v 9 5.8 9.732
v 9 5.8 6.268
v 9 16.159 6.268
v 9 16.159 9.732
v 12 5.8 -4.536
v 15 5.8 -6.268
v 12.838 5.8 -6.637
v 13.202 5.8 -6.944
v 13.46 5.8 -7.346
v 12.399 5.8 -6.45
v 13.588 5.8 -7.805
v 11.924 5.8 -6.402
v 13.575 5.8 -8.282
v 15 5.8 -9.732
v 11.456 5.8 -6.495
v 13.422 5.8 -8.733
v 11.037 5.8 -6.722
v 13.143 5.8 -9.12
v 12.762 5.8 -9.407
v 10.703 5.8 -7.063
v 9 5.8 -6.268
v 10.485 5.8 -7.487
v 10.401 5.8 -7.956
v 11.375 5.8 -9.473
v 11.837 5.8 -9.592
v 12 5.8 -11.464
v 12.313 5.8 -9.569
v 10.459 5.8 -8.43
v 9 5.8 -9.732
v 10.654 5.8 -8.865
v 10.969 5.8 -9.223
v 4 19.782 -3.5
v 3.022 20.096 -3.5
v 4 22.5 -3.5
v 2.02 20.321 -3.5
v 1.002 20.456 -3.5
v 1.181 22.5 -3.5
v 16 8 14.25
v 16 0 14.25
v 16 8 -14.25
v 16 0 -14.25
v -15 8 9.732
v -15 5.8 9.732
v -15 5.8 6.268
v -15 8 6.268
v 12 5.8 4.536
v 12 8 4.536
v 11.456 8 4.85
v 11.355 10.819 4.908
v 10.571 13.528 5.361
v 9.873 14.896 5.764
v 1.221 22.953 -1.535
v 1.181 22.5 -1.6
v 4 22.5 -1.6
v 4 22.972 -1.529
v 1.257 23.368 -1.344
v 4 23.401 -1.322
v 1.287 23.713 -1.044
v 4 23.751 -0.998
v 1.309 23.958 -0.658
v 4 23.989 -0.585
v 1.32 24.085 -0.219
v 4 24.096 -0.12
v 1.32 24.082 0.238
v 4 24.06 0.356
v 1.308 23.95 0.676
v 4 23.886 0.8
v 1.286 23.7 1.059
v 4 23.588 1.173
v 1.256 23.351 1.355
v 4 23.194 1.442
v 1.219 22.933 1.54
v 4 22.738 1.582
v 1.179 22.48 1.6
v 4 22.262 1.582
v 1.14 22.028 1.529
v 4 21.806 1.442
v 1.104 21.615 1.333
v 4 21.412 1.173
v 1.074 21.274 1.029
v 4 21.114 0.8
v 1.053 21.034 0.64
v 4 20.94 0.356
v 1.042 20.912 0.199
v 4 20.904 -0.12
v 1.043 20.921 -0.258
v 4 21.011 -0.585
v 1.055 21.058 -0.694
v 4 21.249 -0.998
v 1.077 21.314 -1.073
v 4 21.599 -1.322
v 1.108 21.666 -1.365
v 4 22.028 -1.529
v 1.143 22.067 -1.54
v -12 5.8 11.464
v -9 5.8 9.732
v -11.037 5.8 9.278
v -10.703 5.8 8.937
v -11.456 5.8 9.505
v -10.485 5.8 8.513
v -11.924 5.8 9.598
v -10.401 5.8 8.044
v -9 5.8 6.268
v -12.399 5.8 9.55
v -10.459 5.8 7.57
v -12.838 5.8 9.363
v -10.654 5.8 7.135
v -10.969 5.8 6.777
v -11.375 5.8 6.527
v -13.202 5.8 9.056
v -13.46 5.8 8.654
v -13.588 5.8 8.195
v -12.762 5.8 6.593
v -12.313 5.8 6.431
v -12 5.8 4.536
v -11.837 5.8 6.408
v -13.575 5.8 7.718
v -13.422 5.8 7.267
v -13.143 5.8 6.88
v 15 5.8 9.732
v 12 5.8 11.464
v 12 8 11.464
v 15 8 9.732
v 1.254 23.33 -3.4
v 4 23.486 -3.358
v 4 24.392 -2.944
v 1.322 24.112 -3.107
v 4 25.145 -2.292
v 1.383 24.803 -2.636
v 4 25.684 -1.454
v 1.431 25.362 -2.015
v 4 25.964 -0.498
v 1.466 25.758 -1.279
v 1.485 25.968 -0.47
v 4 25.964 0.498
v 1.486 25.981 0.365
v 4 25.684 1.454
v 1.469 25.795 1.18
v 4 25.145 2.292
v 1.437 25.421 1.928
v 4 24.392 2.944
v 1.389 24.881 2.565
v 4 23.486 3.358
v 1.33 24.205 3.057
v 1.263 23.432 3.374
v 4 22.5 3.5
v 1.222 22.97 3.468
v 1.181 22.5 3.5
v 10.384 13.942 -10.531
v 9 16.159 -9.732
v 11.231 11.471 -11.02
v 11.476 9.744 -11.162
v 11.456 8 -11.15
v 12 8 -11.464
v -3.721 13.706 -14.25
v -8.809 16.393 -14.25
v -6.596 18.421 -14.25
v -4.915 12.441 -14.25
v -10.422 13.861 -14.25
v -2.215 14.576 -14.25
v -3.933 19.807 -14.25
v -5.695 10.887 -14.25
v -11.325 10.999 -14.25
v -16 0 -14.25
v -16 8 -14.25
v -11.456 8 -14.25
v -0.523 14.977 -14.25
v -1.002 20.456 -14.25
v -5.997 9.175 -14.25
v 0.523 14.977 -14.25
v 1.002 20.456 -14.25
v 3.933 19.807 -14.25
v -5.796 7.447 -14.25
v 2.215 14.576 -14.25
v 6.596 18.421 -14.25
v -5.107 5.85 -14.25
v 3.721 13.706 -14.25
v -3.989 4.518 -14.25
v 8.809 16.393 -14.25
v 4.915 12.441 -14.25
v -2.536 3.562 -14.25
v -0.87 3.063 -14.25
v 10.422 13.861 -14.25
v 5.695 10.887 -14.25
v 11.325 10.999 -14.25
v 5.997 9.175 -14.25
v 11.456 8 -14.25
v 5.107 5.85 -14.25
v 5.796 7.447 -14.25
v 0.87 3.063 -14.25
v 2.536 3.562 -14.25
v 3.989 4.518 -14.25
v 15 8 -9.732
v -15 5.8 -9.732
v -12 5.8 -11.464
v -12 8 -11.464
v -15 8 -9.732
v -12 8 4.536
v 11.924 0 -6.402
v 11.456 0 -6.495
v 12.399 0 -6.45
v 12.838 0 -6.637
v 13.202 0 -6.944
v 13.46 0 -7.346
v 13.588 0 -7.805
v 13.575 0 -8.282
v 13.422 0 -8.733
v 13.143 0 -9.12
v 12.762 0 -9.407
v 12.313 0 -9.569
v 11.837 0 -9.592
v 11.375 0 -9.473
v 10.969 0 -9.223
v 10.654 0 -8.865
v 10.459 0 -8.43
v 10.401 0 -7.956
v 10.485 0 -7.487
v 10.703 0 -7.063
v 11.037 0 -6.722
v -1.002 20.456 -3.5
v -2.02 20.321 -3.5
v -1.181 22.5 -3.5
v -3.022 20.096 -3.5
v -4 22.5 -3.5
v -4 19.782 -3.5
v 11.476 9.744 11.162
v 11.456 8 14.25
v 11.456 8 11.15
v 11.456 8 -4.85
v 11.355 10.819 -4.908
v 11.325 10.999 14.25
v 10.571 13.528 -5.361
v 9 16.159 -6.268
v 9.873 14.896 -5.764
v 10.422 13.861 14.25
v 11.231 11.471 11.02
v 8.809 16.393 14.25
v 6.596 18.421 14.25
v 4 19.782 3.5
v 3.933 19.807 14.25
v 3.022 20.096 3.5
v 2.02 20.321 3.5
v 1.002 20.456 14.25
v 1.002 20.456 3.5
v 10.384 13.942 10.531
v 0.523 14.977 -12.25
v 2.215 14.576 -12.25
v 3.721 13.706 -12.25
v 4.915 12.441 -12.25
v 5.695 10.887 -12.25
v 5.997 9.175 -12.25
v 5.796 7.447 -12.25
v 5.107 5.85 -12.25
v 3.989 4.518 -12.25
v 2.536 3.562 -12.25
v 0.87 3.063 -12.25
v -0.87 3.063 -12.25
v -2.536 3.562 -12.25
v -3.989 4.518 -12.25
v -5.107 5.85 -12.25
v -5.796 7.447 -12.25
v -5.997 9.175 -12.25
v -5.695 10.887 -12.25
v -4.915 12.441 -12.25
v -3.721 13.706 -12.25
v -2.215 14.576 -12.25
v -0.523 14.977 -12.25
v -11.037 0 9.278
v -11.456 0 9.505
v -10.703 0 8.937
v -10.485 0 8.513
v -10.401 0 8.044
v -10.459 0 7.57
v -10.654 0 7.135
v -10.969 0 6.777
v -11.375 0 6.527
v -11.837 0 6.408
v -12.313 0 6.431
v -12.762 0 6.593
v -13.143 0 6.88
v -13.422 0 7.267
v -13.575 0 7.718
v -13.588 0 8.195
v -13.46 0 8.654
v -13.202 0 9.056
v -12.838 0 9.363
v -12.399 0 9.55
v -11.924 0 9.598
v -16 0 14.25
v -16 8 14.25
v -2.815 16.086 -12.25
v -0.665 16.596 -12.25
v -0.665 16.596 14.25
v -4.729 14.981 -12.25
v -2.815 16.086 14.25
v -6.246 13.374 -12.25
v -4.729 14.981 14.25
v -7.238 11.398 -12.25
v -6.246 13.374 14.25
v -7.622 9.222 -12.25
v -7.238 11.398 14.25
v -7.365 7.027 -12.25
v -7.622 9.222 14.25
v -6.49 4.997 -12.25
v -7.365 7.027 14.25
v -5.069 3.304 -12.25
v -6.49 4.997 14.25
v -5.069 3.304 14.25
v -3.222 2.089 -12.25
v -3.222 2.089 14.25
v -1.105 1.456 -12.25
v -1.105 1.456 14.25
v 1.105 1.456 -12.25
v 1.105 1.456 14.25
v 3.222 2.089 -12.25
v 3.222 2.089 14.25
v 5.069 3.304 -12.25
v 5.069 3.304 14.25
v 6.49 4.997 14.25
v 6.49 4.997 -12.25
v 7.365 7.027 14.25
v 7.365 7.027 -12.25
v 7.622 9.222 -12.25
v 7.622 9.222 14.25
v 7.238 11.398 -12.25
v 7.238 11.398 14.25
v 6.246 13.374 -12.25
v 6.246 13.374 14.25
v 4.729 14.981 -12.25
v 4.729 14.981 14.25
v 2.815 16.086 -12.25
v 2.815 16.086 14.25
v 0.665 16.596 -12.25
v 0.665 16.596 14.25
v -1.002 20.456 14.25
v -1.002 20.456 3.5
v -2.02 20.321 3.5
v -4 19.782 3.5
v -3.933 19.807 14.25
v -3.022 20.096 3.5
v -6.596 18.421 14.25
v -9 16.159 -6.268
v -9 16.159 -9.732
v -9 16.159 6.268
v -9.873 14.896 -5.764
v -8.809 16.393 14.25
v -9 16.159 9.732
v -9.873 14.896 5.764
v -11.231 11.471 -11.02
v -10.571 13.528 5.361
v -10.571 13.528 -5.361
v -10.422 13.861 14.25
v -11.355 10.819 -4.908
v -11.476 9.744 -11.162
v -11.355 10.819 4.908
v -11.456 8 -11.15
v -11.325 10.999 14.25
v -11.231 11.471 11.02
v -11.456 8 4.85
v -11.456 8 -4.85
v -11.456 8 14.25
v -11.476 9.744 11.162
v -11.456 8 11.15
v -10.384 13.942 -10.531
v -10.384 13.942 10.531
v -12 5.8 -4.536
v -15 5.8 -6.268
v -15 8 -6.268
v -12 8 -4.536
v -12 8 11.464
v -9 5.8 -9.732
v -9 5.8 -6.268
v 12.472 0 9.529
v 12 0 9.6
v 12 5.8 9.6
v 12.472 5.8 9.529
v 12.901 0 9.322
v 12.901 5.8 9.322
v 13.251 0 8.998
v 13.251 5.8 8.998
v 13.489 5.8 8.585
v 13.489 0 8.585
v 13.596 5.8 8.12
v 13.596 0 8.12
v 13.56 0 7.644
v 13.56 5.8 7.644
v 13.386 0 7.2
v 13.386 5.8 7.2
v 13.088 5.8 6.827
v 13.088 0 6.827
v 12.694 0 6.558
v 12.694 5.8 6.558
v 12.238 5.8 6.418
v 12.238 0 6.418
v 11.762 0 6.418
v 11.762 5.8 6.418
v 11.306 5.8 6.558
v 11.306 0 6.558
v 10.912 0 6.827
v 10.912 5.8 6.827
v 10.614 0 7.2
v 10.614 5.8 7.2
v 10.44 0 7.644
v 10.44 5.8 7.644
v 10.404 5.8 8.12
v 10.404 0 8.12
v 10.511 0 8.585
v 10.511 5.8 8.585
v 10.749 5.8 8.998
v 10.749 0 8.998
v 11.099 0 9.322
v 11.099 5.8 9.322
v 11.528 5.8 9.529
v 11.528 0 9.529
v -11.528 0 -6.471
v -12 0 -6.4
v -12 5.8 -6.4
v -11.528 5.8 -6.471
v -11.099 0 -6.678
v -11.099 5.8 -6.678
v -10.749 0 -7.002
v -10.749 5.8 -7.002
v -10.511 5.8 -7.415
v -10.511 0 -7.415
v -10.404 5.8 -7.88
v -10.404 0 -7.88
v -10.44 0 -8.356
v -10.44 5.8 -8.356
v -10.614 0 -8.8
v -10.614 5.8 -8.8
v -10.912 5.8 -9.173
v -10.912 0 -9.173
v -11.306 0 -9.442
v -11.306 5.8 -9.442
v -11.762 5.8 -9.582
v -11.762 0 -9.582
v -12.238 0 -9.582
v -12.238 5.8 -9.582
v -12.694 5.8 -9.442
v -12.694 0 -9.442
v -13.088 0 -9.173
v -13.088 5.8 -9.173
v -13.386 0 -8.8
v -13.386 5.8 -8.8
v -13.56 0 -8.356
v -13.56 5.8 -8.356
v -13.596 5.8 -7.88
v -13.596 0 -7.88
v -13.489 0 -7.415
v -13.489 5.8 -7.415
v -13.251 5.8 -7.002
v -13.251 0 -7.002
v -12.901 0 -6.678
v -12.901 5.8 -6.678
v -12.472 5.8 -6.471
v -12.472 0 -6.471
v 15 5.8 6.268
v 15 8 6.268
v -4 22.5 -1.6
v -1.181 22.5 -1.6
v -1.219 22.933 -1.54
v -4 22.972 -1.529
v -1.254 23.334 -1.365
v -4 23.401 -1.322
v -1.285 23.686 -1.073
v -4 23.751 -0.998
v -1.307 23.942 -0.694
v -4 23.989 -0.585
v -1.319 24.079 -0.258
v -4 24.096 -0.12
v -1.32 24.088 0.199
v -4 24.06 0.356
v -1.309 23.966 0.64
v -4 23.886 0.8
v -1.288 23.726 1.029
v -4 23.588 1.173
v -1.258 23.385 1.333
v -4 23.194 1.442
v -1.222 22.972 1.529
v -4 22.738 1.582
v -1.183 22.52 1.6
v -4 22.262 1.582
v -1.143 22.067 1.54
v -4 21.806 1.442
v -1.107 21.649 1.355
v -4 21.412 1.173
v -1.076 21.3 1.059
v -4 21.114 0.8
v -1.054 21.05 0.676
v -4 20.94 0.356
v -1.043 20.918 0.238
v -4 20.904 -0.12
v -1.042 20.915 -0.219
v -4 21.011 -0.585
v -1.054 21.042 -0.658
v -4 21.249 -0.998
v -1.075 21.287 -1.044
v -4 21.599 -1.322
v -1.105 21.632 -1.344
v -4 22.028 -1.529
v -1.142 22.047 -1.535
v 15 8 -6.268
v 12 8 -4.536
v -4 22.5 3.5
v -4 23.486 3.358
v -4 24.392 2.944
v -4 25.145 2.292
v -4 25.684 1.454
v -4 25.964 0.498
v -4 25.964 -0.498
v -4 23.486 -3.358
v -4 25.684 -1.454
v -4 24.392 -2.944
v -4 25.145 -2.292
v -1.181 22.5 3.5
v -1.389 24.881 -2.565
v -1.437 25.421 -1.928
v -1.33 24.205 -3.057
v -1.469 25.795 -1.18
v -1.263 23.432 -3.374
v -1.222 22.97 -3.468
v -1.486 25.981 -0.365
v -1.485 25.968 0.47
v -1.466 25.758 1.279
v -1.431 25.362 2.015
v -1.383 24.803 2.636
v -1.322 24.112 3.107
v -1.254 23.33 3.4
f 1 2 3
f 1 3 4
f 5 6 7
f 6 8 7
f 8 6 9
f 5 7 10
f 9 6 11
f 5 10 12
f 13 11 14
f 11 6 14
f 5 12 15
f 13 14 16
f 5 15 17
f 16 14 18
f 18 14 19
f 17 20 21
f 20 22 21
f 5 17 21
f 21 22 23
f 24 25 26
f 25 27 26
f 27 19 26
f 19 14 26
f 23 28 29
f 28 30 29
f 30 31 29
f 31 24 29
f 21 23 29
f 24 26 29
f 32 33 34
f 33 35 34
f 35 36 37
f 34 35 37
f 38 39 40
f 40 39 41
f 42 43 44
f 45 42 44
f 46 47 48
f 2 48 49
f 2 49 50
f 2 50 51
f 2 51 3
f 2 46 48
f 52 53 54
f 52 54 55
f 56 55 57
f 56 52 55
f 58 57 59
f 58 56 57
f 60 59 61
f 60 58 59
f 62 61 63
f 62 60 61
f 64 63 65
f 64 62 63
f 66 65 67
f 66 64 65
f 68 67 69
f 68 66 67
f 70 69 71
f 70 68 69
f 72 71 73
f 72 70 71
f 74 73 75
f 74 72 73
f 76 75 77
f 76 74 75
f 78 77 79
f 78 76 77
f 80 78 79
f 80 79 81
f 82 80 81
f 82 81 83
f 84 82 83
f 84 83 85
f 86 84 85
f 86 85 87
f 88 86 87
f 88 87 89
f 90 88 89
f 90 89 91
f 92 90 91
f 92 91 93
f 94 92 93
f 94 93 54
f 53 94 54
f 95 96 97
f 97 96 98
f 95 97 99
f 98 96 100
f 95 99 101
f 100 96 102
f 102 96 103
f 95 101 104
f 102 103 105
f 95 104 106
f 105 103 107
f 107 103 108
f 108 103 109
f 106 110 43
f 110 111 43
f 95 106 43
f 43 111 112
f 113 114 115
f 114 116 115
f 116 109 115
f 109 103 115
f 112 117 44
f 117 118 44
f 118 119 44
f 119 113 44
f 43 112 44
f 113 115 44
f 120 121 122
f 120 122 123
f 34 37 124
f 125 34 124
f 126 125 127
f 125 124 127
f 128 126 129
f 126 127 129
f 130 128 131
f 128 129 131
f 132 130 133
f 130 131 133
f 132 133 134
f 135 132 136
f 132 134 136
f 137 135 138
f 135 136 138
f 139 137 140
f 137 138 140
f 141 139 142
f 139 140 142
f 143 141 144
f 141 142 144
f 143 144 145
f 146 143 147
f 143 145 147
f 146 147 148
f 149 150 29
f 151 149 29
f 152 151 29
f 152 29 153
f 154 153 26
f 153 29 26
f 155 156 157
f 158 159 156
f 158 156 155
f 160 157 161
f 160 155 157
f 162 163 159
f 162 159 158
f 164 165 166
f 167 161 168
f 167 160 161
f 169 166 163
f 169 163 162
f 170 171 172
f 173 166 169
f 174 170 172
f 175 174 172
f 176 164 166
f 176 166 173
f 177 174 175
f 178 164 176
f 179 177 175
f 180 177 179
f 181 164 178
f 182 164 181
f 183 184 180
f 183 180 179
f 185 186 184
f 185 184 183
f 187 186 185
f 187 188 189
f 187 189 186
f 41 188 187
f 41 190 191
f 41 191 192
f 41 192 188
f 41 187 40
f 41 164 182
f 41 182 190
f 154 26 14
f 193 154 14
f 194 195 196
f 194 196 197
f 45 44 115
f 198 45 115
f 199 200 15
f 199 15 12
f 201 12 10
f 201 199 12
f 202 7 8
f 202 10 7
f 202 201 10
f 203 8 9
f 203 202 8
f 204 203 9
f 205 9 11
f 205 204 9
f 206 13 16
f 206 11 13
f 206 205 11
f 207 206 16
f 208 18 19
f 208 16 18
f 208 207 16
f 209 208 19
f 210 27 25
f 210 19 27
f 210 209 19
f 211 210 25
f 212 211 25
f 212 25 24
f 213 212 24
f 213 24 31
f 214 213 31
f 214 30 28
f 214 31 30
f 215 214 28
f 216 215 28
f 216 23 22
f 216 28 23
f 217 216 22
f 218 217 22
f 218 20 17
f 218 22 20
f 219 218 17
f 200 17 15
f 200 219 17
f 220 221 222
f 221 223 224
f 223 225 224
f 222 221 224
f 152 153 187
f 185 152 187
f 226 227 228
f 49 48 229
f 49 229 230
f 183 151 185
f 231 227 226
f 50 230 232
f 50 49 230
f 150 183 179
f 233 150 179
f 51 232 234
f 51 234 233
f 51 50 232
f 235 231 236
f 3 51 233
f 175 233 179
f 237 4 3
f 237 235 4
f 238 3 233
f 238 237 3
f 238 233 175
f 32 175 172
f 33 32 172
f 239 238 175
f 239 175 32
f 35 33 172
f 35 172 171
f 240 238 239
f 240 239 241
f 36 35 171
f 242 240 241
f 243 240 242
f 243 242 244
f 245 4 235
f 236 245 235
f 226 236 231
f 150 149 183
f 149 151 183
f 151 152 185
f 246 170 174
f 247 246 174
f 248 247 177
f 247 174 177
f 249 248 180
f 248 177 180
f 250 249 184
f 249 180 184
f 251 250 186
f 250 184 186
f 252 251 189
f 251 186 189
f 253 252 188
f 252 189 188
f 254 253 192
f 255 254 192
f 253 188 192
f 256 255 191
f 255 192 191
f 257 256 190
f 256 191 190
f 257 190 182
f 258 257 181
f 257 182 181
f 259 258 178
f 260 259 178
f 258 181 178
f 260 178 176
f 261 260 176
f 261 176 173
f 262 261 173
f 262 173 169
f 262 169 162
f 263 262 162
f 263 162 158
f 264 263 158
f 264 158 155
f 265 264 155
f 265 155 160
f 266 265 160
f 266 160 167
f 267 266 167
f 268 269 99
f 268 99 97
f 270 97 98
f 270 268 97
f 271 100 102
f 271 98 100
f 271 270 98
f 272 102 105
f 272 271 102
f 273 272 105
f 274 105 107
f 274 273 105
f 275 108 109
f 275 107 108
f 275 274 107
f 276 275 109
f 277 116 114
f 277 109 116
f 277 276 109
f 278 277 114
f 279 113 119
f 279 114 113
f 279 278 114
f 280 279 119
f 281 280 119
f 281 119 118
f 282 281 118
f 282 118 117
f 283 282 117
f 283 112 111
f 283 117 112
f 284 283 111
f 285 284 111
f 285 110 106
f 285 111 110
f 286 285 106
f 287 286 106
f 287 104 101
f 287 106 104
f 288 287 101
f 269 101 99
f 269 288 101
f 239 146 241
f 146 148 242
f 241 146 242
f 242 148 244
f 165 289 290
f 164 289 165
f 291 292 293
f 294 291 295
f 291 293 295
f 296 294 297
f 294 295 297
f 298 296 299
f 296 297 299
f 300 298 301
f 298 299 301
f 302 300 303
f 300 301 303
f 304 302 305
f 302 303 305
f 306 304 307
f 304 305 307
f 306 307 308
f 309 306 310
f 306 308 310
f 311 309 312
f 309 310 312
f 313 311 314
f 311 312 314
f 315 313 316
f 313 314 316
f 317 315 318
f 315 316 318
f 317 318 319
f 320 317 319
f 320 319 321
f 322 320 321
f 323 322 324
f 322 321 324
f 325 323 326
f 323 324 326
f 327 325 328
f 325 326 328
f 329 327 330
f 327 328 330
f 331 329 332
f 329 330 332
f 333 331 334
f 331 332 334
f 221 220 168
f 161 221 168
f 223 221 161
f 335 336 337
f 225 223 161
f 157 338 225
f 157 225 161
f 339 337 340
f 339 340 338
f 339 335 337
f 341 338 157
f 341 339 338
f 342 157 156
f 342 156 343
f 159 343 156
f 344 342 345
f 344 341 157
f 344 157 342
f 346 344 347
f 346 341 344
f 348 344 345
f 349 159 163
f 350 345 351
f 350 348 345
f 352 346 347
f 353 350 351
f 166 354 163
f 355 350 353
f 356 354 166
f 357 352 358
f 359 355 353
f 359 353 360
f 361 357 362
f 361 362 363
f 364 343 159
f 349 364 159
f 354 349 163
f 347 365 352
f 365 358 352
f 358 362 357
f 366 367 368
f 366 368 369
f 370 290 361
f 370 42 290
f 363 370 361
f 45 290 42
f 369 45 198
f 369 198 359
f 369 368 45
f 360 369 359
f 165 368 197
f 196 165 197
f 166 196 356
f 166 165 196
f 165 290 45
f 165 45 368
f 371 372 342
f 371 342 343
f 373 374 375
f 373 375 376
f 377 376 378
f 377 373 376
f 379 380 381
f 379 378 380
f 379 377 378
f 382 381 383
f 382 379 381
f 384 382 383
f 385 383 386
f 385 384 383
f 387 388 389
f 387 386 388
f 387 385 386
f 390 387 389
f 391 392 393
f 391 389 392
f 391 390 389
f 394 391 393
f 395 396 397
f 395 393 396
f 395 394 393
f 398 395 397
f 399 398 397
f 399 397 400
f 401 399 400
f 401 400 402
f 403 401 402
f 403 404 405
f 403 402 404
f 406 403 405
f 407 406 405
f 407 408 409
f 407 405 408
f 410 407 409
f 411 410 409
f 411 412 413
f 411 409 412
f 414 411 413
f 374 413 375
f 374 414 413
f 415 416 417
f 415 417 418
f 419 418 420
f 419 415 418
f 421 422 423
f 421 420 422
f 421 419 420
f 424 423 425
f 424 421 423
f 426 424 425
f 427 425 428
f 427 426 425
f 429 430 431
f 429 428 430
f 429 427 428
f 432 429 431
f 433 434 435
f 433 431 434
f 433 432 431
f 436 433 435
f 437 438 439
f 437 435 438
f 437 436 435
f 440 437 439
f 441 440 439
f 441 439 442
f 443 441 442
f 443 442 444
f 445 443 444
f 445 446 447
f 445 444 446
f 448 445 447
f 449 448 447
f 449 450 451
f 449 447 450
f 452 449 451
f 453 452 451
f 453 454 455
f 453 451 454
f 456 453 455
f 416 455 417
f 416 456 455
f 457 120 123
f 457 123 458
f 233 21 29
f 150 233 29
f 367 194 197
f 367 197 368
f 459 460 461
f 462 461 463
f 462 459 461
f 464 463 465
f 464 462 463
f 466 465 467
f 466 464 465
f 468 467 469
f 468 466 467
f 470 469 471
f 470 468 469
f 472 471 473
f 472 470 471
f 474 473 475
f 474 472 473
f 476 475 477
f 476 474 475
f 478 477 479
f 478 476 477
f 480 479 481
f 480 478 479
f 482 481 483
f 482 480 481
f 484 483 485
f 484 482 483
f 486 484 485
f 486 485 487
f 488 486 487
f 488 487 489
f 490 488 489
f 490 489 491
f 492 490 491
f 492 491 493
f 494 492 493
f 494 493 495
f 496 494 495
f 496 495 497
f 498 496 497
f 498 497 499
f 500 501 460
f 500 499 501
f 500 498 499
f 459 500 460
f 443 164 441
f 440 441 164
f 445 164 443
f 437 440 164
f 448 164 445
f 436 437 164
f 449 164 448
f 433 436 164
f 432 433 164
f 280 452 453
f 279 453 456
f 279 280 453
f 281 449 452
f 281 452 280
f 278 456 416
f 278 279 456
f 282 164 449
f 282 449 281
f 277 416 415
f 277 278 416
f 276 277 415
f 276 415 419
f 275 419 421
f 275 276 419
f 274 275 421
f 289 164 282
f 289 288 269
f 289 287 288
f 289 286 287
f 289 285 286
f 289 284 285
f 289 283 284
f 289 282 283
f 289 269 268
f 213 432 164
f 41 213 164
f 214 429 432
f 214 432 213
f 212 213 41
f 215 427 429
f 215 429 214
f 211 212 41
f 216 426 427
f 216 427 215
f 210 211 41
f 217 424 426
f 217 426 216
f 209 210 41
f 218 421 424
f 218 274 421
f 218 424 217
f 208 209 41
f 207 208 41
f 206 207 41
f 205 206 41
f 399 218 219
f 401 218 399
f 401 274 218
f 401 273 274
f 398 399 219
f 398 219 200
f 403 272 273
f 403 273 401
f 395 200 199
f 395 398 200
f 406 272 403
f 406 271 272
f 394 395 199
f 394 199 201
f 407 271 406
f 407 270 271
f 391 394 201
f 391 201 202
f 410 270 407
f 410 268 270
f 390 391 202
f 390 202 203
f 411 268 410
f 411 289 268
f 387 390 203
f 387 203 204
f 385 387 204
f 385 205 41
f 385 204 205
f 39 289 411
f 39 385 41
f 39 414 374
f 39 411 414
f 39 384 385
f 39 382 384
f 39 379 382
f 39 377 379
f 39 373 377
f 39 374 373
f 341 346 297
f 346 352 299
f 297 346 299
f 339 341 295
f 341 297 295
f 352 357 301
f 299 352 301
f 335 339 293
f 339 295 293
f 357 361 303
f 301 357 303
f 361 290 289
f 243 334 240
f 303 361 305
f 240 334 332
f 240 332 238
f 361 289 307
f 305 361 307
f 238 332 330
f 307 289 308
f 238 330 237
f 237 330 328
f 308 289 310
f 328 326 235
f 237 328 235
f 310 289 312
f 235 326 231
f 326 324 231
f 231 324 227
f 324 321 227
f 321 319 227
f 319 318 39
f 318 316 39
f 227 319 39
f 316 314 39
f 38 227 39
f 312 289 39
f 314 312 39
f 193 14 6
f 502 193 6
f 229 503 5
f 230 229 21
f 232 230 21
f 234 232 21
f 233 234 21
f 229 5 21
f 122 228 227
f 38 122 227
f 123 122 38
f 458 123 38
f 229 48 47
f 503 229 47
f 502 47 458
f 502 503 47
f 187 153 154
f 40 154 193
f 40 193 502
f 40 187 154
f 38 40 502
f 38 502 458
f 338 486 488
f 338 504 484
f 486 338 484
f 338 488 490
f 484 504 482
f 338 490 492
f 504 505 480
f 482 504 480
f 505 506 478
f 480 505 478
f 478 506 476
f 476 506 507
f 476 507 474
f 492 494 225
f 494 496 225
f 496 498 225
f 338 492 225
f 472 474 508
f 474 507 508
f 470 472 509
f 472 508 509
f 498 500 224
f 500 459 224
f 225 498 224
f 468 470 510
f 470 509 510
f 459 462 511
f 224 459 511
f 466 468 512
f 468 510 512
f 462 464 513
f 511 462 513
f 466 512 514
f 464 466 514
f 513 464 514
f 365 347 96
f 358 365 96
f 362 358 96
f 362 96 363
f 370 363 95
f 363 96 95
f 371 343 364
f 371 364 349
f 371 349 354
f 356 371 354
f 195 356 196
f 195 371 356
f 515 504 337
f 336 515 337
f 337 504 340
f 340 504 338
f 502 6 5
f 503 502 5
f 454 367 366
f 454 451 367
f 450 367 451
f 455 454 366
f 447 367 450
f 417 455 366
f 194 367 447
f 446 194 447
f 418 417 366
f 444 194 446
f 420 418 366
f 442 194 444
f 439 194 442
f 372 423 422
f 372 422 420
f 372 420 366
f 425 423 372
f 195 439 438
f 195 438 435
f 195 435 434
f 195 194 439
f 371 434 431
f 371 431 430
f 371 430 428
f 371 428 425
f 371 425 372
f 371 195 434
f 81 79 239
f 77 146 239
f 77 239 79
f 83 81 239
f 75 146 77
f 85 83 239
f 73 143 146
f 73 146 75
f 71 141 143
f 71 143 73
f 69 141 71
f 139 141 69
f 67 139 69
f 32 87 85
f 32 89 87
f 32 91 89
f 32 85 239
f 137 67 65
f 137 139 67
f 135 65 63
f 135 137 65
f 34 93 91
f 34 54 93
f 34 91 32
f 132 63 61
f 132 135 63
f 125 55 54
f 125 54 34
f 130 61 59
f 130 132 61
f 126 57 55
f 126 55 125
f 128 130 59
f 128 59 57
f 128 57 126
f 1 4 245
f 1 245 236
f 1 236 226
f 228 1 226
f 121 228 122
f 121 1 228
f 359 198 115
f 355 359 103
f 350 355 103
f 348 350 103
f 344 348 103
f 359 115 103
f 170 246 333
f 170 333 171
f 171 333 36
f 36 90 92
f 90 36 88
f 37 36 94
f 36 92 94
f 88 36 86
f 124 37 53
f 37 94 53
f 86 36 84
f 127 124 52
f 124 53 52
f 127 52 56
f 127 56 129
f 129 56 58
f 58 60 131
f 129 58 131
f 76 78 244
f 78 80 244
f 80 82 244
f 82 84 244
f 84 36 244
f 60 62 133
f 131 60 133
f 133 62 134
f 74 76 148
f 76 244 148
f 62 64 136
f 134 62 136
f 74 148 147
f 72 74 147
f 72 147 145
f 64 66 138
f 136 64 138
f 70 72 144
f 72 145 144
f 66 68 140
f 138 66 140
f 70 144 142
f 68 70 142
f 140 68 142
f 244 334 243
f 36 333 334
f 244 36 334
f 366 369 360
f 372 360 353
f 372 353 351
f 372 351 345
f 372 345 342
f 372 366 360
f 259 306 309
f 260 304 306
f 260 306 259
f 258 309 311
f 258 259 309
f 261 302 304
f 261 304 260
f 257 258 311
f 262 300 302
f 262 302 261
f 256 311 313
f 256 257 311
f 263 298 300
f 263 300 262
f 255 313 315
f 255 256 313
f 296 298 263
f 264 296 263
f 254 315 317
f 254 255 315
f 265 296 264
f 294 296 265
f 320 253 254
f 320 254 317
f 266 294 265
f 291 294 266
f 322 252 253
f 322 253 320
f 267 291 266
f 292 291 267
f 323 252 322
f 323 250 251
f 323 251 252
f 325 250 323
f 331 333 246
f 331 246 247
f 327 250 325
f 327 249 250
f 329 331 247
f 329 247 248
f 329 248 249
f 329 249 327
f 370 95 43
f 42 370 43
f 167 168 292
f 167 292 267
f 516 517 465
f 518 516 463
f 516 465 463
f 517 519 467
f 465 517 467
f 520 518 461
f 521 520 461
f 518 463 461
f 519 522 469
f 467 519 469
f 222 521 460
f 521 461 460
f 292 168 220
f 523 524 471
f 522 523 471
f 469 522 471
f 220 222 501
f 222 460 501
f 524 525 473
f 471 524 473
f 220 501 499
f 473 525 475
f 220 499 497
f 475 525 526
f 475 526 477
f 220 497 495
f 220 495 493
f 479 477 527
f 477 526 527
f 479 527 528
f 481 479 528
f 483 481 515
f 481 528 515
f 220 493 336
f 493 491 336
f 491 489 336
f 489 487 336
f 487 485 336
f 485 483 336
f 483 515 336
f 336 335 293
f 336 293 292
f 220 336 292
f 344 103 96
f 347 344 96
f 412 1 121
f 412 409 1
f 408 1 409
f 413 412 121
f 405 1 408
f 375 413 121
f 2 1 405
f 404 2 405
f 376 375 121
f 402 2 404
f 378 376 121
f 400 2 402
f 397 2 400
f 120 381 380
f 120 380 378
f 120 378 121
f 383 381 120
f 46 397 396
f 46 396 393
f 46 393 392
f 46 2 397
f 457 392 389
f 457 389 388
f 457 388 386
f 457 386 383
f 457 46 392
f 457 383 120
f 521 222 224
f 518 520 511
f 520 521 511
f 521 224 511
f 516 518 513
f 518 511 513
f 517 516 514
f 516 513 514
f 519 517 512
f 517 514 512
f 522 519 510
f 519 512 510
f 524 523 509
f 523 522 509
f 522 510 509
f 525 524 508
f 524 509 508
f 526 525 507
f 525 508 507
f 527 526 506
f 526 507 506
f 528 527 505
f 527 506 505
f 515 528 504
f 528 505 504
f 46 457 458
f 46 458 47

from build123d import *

# Parameters (mm, degrees)
SKETCH1_W                = 32
SKETCH1_H                = 28.5
BOSS_EXTRUDE1_DEPTH      = 8
BOSS_EXTRUDE2_DEPTH      = 28.5
SKETCH4_R                = 7.625
CUT_EXTRUDE2_DEPTH       = 26.5
SKETCH5_R                = 6
CUT_EXTRUDE3_DEPTH       = 39.581083448
CUT_EXTRUDE1_DEPTH       = 25.805493343
CUT_EXTRUDE1_DEPTH_BACK  = 25.805493343
SKETCH2_R                = 1.6
CUT_EXTRUDE4_DEPTH       = 25.805493451
CUT_EXTRUDE4_DEPTH_BACK  = 2.2
BOSS_EXTRUDE3_DEPTH      = 4
BOSS_EXTRUDE3_DEPTH_BACK = 4
SKETCH8_R                = 1.6
CUT_EXTRUDE5_DEPTH       = 42.764219136


with BuildPart() as part:
    # Sketch1 → Boss-Extrude1 (new body)
    with BuildSketch(Plane(origin=(0, 0, 0), x_dir=(1, 0, 0), z_dir=(0, 1, 0))):
        Rectangle(SKETCH1_W, SKETCH1_H)
    extrude(amount=BOSS_EXTRUDE1_DEPTH)

    # Sketch3 → Boss-Extrude2 (add, through all)
    with BuildSketch(Plane.XY.offset(14.25)):
        with BuildLine():
            Line((-7.158910532, 0), (7.158910532, 0))
            ThreePointArc((7.158910532, 0), (0, 20.5), (-7.158910532, 0))
        make_face()
    extrude(amount=-BOSS_EXTRUDE2_DEPTH)

    # Sketch4 → Cut-Extrude2 (cut)
    with BuildSketch(Plane.XY.offset(14.25)):
        with Locations((0, 9)):
            Circle(SKETCH4_R)
    extrude(amount=-CUT_EXTRUDE2_DEPTH, mode=Mode.SUBTRACT)

    # Sketch5 → Cut-Extrude3 (cut, through all)
    with BuildSketch(Plane(origin=(0, 0, -14.25), x_dir=(-1, 0, 0), z_dir=(0, 0, -1))):
        with Locations((0, 9)):
            Circle(SKETCH5_R)
    extrude(amount=-CUT_EXTRUDE3_DEPTH, mode=Mode.SUBTRACT)

    # Sketch2 → Cut-Extrude1 (cut, two sides: drawn at the far end of the back side and taken through both)
    with BuildSketch(Plane(origin=(0, 8, 0), x_dir=(1, 0, 0), z_dir=(0, 1, 0)).offset(-CUT_EXTRUDE1_DEPTH_BACK)):
        with Locations(Location((-12, 8, 0), (0, 0, 270))):
            Circle(SKETCH2_R)
        with Locations(Location((12, 8, 0), (0, 0, 250.139850489))):
            Circle(SKETCH2_R)
        with Locations(Location((12, -8, 0), (0, 0, 270))):
            Circle(SKETCH2_R)
        with Locations(Location((-12, -8, 0), (0, 0, 289.860135815))):
            Circle(SKETCH2_R)
    extrude(amount=CUT_EXTRUDE1_DEPTH + CUT_EXTRUDE1_DEPTH_BACK, mode=Mode.SUBTRACT)

    # Sketch6 → Cut-Extrude4 (cut, two sides: drawn at the far end of the back side and taken through both)
    with BuildSketch(Plane(origin=(0, 8, 0), x_dir=(1, 0, 0), z_dir=(0, 1, 0)).offset(-CUT_EXTRUDE4_DEPTH_BACK)):
        Polygon((-12, 11.464101615), (-15, 9.732050808), (-15, 6.267949192), (-12, 4.535898385), (-9, 6.267949192), (-9, 9.732050808), align=None)
        Polygon((-9, -9.732050808), (-12, -11.464101615), (-15, -9.732050808), (-15, -6.267949192), (-12, -4.535898385), (-9, -6.267949192), align=None)
        Polygon((12, -11.464101615), (15, -9.732050808), (15, -6.267949192), (12, -4.535898385), (9, -6.267949192), (9, -9.732050808), align=None)
        Polygon((9, 9.732050808), (12, 11.464101615), (15, 9.732050808), (15, 6.267949192), (12, 4.535898385), (9, 6.267949192), align=None)
    extrude(amount=CUT_EXTRUDE4_DEPTH + CUT_EXTRUDE4_DEPTH_BACK, mode=Mode.SUBTRACT)

    # Sketch8 → Boss-Extrude3 (add, two sides: drawn at the far end of the back side and taken through both)
    with BuildSketch(Plane(origin=(0, 0, 0), x_dir=(0, 0, -1), z_dir=(1, 0, 0)).offset(-BOSS_EXTRUDE3_DEPTH_BACK)):
        with BuildLine():
            Line((-3.5, 22.5), (-3.5, 18.5))
            Line((-3.5, 18.5), (3.5, 18.5))
            Line((3.5, 18.5), (3.5, 22.5))
            ThreePointArc((3.5, 22.5), (0, 26), (-3.5, 22.5))
        make_face()
        with Locations((0, 22.5)):
            Circle(SKETCH8_R, mode=Mode.SUBTRACT)
    extrude(amount=BOSS_EXTRUDE3_DEPTH + BOSS_EXTRUDE3_DEPTH_BACK)

    # Sketch9 → Cut-Extrude5 (cut, through all)
    with BuildSketch(Plane.XY.offset(14.25)):
        with BuildLine():
            Line((0, 9), (1.743114855, 28.923893962))
            ThreePointArc((1.743114855, 28.923893962), (0, 29), (-1.743114855, 28.923893962))
            Line((-1.743114855, 28.923893962), (0, 9))
        make_face()
    extrude(amount=-CUT_EXTRUDE5_DEPTH, mode=Mode.SUBTRACT)


solid = part.part
